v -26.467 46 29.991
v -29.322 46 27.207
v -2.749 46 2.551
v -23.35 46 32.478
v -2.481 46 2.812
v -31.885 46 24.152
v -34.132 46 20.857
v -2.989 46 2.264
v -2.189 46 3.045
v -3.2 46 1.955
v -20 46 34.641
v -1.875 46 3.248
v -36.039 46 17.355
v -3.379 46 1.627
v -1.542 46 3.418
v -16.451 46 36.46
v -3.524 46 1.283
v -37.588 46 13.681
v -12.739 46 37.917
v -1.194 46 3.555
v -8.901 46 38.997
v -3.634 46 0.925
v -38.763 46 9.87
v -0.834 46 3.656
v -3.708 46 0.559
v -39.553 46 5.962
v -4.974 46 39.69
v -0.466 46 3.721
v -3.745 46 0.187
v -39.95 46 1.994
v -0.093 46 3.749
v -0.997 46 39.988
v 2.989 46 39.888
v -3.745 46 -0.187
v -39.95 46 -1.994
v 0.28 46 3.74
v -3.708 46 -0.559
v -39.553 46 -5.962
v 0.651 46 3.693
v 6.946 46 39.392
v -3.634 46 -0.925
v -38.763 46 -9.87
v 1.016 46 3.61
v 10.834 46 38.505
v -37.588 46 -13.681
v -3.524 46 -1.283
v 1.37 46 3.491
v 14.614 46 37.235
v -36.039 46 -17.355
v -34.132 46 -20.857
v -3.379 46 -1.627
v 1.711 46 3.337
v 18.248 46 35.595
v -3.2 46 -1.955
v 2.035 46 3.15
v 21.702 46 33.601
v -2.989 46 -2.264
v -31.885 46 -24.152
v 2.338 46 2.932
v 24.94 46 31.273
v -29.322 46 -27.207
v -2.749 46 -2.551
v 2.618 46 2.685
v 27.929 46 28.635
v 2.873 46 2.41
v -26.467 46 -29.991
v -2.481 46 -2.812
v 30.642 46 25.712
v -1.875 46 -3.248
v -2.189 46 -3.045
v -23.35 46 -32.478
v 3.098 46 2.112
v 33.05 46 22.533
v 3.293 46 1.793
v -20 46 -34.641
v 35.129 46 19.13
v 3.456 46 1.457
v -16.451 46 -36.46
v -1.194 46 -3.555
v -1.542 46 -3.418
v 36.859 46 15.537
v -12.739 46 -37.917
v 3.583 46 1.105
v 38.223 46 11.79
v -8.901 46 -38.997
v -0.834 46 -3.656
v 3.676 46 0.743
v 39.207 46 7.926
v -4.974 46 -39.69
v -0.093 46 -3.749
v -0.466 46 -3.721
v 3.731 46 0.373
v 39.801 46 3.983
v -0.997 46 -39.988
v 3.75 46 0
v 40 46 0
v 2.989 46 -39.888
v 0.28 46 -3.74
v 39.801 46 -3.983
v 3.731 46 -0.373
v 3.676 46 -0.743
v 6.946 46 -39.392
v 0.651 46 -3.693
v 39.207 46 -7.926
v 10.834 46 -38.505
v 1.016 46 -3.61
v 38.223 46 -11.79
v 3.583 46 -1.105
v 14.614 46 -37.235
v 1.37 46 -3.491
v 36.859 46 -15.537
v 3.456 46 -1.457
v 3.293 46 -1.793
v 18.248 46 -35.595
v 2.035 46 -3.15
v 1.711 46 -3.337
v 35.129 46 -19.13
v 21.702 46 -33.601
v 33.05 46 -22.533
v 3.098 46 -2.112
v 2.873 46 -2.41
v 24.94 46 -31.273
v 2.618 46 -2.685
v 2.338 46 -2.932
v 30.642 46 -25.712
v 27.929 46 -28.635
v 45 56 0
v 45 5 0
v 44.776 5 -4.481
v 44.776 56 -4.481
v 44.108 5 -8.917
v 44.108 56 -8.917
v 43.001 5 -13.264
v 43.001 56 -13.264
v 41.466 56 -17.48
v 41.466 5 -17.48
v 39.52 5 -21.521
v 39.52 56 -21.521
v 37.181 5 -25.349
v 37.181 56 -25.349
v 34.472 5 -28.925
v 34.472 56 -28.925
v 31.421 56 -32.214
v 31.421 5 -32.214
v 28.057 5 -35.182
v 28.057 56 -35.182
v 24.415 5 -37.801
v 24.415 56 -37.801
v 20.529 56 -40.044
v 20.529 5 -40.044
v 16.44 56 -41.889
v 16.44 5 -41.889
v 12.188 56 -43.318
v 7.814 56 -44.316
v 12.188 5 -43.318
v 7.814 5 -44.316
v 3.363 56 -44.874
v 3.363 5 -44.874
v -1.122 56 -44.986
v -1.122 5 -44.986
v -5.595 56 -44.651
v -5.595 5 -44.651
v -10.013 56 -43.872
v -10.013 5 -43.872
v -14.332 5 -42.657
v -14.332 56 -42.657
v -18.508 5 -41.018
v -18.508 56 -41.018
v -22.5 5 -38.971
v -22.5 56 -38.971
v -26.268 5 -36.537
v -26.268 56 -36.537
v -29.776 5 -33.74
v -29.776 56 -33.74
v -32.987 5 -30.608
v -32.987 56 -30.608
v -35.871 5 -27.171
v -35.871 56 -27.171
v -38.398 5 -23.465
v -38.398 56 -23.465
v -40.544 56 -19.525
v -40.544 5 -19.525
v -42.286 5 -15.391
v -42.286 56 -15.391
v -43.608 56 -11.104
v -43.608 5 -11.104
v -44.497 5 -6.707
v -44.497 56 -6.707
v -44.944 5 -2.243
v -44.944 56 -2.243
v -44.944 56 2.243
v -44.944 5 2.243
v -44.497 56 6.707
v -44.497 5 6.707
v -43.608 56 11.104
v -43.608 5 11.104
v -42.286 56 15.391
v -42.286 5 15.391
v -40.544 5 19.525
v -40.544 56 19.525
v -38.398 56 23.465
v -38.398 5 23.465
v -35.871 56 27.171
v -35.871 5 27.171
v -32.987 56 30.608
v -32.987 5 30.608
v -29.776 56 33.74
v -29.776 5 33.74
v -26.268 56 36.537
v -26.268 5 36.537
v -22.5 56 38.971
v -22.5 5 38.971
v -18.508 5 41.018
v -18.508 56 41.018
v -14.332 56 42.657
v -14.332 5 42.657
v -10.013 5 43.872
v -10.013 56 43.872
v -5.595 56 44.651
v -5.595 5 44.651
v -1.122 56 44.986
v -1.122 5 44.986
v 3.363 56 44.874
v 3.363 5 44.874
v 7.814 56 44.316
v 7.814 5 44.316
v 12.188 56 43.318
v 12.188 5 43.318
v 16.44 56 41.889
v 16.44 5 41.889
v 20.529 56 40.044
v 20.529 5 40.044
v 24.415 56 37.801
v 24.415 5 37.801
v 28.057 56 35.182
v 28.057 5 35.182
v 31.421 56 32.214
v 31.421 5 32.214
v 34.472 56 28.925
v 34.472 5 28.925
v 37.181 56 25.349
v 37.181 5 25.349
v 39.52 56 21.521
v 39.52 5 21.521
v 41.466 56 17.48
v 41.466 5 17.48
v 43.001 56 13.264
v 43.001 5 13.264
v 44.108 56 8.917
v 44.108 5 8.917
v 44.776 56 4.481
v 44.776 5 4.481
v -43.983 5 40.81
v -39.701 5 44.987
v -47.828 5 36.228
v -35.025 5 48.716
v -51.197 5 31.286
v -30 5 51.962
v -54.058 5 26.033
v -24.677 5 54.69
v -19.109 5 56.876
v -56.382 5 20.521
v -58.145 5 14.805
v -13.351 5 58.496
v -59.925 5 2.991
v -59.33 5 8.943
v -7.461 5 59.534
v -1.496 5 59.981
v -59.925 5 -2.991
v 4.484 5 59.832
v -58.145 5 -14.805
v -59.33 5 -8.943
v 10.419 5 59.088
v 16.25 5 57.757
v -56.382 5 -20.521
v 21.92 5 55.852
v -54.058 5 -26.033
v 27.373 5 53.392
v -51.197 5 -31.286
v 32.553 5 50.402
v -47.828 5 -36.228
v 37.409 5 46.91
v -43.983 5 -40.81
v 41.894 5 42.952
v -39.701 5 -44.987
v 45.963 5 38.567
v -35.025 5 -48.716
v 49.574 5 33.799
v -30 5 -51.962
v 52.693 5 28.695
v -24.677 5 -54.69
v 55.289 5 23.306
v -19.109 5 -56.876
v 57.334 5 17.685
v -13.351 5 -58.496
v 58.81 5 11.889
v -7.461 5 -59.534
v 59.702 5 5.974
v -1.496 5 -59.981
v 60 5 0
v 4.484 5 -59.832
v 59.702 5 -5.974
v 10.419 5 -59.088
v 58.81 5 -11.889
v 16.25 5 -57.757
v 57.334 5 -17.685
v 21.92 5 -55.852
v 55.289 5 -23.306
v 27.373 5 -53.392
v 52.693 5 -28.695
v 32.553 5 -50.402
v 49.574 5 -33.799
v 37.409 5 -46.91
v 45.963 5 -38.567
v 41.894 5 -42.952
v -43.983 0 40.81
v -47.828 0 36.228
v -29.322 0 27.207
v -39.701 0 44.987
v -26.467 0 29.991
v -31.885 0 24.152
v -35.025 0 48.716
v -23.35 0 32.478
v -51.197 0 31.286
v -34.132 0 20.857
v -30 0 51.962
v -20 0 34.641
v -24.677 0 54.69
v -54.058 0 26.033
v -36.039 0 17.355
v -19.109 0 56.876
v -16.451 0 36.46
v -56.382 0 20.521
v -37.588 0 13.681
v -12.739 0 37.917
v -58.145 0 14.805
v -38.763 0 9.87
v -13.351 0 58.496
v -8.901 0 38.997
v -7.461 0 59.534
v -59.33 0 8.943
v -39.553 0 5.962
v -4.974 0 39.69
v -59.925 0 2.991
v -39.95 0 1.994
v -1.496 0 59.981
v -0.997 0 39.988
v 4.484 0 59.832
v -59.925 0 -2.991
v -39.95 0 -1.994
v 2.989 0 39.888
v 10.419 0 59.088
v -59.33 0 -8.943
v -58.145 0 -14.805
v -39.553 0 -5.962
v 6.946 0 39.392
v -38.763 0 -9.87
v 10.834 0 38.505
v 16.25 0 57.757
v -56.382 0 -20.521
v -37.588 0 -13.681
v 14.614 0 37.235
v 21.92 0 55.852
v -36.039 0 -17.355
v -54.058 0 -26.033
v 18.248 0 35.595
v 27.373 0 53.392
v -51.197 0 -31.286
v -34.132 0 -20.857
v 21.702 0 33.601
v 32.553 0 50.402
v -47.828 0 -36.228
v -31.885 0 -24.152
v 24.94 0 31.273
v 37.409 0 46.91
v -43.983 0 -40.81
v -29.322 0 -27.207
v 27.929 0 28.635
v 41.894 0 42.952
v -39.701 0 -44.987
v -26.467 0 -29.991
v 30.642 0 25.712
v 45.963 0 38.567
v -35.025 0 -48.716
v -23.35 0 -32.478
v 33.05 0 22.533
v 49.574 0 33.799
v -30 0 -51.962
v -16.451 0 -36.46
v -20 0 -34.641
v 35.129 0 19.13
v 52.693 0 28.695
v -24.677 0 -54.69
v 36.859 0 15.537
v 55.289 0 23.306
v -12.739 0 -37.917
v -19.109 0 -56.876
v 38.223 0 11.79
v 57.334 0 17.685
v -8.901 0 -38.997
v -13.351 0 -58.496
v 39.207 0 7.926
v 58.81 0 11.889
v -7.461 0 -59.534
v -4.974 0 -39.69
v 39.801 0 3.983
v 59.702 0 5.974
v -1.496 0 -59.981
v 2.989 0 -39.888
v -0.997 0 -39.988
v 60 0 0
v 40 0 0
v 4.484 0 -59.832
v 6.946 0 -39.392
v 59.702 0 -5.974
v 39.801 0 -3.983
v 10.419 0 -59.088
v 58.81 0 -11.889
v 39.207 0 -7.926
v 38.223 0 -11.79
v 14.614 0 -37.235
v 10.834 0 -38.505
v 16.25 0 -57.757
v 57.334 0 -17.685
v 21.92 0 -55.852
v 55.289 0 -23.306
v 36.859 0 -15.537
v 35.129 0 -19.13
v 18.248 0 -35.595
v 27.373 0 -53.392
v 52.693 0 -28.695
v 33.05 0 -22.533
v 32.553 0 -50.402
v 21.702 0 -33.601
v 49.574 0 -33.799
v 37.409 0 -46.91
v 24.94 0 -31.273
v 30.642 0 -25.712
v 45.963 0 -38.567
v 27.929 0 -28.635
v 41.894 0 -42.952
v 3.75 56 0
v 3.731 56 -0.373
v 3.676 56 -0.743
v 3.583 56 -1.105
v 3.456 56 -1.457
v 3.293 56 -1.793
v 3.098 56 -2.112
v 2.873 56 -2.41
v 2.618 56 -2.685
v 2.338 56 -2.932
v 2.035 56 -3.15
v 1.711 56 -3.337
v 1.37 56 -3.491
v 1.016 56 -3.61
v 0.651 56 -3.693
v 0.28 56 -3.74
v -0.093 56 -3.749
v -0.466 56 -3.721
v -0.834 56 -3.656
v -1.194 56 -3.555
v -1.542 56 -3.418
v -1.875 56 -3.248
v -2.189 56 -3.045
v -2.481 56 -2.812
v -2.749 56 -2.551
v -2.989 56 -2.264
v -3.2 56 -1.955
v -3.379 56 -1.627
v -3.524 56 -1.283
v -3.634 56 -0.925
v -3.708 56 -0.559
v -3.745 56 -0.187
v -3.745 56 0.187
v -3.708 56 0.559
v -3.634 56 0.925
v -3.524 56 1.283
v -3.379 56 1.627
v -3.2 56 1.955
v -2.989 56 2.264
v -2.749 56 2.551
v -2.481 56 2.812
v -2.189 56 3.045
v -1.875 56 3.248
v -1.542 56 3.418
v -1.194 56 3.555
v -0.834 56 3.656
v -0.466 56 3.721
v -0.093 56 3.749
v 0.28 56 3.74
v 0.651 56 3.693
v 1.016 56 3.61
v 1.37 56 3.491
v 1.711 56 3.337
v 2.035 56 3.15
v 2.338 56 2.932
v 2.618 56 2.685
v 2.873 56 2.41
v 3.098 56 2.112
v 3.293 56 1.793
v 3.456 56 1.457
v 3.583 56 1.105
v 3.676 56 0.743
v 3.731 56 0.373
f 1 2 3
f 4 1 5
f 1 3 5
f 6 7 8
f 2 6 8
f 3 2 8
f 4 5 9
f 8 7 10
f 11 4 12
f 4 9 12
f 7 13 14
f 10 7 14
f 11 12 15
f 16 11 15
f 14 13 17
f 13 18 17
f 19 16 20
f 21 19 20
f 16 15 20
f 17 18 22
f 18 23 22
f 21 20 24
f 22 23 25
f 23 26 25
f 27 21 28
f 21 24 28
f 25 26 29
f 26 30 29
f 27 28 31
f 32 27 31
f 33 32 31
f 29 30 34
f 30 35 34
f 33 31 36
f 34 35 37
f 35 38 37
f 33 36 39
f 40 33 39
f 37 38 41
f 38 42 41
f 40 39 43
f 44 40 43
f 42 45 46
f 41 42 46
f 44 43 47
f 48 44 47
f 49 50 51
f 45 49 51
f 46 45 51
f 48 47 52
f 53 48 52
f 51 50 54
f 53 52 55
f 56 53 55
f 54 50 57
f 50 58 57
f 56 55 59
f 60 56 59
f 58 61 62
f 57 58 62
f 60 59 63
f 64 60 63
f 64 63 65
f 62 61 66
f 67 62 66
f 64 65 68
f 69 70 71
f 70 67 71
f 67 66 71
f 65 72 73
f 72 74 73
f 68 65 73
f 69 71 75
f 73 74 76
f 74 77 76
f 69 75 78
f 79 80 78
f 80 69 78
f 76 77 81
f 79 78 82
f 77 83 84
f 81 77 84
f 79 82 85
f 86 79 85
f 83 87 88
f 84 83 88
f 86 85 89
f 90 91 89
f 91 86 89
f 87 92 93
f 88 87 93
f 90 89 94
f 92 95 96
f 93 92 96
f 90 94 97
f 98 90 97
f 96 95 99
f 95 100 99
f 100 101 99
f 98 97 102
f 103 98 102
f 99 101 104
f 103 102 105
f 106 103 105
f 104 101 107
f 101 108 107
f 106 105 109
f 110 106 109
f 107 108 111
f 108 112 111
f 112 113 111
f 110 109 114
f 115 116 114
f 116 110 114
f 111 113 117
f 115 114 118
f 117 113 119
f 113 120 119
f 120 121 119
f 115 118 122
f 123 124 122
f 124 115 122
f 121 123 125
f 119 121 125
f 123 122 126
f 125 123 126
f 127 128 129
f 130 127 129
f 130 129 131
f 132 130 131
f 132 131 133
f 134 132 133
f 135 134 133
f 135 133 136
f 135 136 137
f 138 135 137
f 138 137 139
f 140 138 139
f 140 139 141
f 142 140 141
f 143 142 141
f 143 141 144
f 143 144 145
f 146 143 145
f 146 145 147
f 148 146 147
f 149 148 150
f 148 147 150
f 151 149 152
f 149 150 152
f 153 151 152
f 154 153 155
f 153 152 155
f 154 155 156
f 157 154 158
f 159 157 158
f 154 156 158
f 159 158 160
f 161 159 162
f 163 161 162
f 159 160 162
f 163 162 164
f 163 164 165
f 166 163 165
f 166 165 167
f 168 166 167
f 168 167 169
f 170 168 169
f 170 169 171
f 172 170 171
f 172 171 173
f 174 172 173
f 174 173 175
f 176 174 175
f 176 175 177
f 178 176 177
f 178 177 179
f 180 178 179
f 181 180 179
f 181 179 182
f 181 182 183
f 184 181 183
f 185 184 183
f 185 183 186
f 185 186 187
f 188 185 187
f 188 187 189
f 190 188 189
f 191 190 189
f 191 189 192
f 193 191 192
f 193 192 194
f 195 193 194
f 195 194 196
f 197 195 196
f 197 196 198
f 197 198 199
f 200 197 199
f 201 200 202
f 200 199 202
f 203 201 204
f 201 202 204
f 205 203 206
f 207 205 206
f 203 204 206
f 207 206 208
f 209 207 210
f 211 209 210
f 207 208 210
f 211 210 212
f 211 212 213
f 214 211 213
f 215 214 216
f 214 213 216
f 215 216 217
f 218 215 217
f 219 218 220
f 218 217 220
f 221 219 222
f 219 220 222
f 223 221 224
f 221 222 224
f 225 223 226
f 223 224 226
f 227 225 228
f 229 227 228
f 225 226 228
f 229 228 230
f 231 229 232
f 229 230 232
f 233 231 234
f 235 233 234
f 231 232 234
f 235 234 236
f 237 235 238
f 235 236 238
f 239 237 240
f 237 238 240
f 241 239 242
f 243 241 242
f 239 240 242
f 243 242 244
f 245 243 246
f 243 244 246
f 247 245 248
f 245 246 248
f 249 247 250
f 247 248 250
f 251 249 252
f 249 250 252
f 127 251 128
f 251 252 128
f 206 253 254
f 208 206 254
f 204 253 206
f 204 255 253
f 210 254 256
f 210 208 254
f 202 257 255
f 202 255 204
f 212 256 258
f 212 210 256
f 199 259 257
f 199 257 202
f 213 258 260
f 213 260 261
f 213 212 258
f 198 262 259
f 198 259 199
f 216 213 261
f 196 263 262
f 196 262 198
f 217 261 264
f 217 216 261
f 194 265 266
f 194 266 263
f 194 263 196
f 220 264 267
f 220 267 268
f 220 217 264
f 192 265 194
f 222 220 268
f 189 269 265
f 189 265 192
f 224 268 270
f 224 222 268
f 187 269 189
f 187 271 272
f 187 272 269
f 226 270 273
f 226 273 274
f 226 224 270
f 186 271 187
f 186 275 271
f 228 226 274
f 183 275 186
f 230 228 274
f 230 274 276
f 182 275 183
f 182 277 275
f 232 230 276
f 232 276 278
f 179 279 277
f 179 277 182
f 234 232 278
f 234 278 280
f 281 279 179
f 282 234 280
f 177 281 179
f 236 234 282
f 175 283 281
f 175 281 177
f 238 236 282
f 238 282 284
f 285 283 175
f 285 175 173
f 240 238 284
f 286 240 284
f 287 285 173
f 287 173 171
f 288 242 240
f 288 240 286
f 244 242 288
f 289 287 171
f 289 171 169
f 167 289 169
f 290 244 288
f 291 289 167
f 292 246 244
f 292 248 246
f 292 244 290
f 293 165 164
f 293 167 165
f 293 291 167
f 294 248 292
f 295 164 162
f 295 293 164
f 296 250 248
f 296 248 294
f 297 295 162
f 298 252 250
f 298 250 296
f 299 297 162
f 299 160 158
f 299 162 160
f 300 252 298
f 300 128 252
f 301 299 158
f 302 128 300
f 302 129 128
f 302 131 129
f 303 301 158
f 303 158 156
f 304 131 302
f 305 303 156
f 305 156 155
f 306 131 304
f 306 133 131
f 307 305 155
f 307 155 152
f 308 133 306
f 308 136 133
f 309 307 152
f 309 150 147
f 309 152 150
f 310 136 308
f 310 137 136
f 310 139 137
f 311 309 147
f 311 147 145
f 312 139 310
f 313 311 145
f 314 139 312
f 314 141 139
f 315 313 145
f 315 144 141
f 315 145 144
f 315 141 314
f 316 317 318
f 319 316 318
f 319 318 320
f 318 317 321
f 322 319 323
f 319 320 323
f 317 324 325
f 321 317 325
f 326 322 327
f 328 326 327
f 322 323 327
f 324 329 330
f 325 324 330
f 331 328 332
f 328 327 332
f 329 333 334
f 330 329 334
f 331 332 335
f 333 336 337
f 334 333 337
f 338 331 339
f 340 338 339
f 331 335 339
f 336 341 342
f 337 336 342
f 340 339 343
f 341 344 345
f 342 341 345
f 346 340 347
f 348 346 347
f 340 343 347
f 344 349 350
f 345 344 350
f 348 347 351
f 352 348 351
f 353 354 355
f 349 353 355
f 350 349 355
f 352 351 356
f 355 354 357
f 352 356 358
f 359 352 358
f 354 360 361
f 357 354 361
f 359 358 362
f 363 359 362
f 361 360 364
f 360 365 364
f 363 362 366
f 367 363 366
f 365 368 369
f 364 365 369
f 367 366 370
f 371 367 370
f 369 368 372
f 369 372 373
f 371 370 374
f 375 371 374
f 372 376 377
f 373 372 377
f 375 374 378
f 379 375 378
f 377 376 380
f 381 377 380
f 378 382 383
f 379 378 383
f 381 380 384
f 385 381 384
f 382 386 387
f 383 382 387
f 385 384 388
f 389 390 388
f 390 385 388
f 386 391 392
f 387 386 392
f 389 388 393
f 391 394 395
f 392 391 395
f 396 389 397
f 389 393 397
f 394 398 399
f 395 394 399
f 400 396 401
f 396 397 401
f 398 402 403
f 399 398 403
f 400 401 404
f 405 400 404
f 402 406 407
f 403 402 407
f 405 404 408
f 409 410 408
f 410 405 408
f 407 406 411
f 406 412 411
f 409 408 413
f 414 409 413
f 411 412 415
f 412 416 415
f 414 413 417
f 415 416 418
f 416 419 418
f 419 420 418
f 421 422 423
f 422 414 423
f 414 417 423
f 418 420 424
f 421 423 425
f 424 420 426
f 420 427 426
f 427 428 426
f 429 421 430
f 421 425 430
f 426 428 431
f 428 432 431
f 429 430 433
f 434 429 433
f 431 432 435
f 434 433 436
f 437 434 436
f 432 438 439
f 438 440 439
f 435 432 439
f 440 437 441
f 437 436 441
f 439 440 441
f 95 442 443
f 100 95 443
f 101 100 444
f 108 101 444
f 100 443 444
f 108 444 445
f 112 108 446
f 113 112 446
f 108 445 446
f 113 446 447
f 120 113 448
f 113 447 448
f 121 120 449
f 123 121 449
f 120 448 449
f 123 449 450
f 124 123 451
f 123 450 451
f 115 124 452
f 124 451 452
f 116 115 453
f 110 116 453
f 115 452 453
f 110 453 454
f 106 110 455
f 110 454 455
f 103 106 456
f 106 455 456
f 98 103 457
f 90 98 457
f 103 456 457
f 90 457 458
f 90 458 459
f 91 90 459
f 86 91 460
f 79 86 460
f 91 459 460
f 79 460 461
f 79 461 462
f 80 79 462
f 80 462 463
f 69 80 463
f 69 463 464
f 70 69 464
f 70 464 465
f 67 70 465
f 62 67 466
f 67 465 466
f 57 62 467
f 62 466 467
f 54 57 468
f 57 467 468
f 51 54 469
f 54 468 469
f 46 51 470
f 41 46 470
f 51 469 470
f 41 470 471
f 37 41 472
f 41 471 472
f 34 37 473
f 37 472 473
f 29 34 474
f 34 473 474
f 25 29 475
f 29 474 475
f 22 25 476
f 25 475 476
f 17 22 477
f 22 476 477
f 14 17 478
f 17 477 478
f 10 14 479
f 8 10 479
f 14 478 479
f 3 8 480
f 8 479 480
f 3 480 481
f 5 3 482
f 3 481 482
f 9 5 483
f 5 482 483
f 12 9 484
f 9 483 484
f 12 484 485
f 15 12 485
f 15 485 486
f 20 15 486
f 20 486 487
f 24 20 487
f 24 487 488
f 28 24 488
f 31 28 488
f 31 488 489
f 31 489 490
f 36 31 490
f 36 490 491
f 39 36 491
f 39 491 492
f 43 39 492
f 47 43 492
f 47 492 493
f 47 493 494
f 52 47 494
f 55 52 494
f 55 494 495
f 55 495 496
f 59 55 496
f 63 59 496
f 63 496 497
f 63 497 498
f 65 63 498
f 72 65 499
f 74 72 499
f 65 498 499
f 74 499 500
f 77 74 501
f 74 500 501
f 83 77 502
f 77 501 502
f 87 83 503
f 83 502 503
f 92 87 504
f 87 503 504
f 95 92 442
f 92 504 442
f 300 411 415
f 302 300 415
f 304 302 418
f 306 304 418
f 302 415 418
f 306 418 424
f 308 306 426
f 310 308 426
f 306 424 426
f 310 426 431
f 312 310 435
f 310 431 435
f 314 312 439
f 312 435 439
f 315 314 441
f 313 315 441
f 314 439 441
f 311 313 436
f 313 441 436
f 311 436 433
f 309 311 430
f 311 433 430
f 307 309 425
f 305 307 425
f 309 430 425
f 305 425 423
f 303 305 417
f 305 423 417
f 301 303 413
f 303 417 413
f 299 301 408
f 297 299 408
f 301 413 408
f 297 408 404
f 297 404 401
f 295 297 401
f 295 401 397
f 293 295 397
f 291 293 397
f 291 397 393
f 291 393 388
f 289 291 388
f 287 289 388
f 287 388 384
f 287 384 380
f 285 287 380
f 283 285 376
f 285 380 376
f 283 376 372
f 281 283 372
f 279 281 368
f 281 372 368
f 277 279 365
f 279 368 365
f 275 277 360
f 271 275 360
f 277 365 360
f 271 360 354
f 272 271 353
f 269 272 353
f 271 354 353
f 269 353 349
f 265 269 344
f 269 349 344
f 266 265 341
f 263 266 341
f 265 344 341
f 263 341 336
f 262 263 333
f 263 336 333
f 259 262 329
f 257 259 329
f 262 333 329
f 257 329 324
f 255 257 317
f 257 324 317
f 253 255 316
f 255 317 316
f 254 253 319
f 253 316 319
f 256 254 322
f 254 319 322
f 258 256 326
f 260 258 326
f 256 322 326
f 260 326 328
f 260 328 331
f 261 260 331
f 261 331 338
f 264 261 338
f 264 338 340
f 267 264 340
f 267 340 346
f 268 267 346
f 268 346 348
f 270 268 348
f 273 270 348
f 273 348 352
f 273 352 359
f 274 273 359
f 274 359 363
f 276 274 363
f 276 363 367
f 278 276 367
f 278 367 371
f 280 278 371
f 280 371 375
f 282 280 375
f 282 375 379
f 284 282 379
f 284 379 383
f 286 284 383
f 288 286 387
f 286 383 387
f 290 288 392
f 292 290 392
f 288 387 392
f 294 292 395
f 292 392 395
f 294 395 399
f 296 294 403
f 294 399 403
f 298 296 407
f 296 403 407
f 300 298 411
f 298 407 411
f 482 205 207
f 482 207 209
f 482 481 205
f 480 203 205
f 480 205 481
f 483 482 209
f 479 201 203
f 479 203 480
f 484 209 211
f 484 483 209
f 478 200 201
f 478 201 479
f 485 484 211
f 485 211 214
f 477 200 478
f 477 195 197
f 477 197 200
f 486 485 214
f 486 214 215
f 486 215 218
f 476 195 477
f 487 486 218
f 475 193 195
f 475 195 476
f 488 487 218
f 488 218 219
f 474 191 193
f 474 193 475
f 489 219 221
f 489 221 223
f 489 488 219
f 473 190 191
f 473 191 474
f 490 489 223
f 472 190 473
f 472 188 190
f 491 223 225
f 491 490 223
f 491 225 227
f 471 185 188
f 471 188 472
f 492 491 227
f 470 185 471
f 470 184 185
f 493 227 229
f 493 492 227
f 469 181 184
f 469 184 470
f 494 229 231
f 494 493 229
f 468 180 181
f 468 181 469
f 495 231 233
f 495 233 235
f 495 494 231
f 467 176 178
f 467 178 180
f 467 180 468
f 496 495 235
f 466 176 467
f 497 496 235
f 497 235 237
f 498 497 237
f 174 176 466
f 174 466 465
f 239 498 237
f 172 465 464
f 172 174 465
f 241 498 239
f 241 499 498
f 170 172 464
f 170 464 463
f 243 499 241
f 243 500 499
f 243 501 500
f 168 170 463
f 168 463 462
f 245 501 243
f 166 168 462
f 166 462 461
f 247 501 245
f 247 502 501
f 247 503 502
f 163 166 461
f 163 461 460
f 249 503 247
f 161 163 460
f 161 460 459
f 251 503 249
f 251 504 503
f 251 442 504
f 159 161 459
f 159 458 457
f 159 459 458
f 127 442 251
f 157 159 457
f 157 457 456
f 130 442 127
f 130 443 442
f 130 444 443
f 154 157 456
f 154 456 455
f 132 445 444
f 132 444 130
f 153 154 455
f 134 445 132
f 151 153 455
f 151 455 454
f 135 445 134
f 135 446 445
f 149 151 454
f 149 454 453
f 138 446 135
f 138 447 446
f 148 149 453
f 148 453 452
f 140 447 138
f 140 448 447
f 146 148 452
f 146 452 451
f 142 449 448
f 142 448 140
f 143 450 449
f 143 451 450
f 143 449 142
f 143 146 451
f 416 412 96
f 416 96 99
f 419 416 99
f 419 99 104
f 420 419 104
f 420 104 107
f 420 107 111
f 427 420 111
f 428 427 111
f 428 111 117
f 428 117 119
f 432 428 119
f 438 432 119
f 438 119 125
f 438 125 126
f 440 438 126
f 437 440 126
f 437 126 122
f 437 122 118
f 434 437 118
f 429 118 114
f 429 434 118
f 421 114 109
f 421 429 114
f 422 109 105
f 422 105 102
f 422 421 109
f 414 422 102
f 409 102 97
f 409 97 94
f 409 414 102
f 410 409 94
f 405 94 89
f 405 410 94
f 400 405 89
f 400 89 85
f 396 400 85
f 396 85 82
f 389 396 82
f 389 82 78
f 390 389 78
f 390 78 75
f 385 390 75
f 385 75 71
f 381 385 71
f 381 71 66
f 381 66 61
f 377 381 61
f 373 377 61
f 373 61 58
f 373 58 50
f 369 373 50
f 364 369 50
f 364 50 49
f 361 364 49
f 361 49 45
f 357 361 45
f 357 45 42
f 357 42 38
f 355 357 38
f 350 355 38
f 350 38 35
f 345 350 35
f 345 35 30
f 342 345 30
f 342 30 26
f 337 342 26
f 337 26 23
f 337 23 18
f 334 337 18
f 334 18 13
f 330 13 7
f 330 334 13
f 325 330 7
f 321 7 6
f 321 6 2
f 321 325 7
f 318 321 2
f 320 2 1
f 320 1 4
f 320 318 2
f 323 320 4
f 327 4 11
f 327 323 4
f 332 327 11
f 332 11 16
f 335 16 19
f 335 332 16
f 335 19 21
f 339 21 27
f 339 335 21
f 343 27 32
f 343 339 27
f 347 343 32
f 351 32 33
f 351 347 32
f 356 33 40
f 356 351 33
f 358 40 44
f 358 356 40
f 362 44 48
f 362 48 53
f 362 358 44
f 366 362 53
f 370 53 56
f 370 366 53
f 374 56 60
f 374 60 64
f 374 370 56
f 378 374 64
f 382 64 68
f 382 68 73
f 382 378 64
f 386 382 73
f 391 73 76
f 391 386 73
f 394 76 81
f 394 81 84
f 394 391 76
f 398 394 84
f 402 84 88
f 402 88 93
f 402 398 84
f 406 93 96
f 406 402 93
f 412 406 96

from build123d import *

# Parameters (mm, degrees)
SKETCH1_R           = 60
SKETCH1_R_2         = 45
BOSS_EXTRUDE1_DEPTH = 5
SKETCH2_R           = 45
SKETCH2_R_2         = 40
BOSS_EXTRUDE2_DEPTH = 56
SKETCH3_R           = 40
SKETCH3_R_2         = 3.75
BOSS_EXTRUDE3_DEPTH = 10


with BuildPart() as part:
    # Sketch1 → Boss-Extrude1 (new body)
    with BuildSketch(Plane(origin=(0, 0, 0), x_dir=(1, 0, 0), z_dir=(0, 1, 0))):
        Circle(SKETCH1_R)
        Circle(SKETCH1_R_2, mode=Mode.SUBTRACT)
    extrude(amount=BOSS_EXTRUDE1_DEPTH)

    # Sketch2 → Boss-Extrude2 (add)
    with BuildSketch(Plane(origin=(0, 0, 0), x_dir=(1, 0, 0), z_dir=(0, 1, 0))):
        Circle(SKETCH2_R)
        Circle(SKETCH2_R_2, mode=Mode.SUBTRACT)
    extrude(amount=BOSS_EXTRUDE2_DEPTH)

    # Sketch3 → Boss-Extrude3 (add)
    with BuildSketch(Plane(origin=(0, 56, 0), x_dir=(1, 0, 0), z_dir=(0, 1, 0))):
        Circle(SKETCH3_R)
        Circle(SKETCH3_R_2, mode=Mode.SUBTRACT)
    extrude(amount=-BOSS_EXTRUDE3_DEPTH)


solid = part.part
